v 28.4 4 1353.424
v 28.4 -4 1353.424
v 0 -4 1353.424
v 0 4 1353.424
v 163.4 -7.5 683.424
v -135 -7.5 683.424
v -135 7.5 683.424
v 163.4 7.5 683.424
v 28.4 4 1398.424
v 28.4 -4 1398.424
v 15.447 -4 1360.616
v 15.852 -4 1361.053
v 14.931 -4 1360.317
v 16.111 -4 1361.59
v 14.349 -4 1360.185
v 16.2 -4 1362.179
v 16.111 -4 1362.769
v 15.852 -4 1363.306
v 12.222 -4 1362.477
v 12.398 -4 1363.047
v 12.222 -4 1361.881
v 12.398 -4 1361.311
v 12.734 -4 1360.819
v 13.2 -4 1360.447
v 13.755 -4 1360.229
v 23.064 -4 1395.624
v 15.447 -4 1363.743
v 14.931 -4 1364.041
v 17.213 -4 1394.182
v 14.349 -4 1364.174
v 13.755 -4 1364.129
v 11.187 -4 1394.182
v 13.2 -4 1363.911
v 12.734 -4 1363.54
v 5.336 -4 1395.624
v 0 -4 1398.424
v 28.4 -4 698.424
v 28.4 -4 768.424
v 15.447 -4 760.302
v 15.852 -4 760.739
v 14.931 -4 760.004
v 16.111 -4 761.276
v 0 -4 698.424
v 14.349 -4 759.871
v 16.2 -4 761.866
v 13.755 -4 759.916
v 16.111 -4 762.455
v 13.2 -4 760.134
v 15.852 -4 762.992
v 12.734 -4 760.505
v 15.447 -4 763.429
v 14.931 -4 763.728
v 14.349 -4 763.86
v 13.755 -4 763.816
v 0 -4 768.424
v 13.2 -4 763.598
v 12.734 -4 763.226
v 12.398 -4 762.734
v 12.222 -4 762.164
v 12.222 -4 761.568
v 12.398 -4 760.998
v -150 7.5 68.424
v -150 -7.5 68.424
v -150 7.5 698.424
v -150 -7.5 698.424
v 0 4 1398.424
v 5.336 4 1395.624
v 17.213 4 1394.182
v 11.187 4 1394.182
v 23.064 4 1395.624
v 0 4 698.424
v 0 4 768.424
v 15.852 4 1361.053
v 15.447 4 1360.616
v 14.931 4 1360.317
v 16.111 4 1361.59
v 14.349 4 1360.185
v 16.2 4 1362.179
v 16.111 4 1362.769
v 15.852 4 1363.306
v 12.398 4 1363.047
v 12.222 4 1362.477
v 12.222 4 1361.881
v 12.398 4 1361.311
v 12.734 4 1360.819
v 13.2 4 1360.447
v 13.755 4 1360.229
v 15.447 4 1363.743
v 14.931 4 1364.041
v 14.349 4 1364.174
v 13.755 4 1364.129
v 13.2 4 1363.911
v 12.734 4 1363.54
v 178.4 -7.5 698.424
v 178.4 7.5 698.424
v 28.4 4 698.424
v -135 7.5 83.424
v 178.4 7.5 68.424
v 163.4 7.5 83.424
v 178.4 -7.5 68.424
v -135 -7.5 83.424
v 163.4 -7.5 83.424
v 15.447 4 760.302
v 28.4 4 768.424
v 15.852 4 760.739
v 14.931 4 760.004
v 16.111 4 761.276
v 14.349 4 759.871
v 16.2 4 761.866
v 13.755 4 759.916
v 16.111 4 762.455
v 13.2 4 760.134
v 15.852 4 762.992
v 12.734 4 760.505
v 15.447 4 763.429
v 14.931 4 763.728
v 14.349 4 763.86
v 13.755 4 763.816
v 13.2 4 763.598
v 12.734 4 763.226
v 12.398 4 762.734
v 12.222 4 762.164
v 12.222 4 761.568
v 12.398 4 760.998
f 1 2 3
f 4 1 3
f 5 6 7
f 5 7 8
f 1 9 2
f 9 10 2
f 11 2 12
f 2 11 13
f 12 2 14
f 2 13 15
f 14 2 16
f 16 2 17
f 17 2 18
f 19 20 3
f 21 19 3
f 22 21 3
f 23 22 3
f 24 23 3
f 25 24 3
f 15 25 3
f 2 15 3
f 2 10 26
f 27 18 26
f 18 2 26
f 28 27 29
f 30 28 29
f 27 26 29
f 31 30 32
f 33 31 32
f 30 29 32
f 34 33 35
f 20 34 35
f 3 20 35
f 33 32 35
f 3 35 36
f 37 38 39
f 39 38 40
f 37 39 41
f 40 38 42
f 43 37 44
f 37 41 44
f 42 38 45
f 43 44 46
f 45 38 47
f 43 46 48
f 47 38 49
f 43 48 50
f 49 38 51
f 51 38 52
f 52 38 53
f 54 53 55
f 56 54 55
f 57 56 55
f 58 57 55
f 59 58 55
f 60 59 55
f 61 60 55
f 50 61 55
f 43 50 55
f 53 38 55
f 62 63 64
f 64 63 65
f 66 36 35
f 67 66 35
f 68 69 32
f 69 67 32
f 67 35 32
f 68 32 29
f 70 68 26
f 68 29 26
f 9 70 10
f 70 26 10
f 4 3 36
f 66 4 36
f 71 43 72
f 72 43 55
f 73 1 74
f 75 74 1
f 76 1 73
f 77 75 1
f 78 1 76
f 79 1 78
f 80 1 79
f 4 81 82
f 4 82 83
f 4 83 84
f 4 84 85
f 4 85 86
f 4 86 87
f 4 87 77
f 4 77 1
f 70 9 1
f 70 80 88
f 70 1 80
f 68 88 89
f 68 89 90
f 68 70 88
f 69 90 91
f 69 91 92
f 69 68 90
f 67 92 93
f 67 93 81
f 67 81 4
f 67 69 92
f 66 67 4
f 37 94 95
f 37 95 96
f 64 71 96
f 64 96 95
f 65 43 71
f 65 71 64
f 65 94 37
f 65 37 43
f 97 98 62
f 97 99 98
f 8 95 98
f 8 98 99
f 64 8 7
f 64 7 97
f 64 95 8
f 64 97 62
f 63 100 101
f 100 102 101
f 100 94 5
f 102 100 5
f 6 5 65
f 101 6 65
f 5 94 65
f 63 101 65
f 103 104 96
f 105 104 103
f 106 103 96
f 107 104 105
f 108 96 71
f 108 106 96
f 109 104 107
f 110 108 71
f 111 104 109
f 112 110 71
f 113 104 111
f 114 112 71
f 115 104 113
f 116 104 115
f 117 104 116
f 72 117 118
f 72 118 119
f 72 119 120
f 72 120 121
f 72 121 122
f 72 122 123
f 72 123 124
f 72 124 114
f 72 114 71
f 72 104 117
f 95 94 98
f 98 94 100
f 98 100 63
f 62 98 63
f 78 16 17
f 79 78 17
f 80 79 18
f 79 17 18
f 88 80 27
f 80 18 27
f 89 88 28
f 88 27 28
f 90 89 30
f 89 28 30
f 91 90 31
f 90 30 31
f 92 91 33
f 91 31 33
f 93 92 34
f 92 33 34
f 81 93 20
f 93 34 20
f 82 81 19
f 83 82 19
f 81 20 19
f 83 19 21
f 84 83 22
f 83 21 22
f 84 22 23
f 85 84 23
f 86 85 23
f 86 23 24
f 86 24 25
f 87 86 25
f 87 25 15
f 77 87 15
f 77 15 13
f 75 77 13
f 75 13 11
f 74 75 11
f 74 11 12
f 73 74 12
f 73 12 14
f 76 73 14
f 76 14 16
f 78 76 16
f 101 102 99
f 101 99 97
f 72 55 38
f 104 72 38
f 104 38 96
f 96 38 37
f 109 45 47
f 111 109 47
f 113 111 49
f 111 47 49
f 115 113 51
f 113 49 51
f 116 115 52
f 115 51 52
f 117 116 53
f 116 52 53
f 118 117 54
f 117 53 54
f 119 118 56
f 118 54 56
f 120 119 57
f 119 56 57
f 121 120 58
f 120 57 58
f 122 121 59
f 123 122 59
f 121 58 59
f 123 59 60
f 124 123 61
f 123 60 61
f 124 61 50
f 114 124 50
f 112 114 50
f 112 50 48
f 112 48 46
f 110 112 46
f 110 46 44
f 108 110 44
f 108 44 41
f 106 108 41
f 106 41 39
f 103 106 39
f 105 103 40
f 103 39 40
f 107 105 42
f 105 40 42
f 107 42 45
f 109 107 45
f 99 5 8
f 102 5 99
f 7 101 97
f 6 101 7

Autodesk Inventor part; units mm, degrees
ref_plane "YZ Plane" through (0, 0, 0) normal (1, 0, 0) x (0, 1, 0)
ref_plane "XZ Plane" through (0, 0, 0) normal (0, 1, 0) x (-1, 0, 0)
sketch "Boceto2" plane through (0, 0, 0) normal (0, 1, 0) x (-1, 0, 0)
  line L0 (350, 0) -> (-350, 0)
  line L1 (-350, 0) -> (-350, 1000)
  line L2 (-120, 1500) -> (80, 1500)
  line L3 (350, 1000) -> (350, 0)
  line L4 (80, 1000) -> (80, 1500)
  line L5 (-120, 1000) -> (-120, 1500)
  line L6 (350, 1000) -> (80, 1000)
  line L7 (-120, 1000) -> (-350, 1000)
  arc A0 (-28.4, 1398.4243) -> (0, 1398.4243) centre (-14.2, 1419) ccw
  line L8 (-28.4, 1398.4243) -> (-28.4, 698.4243)
  line L9 (-28.4, 698.4243) -> (0, 698.4243)
  line L10 (0, 698.4243) -> (0, 1398.4243)
  line L11 (150, 698.4243) -> (-178.4, 698.4243)
  line L12 (-178.4, 698.4243) -> (-178.4, 68.4243)
  line L13 (-178.4, 68.4243) -> (150, 68.4243)
  line L14 (150, 68.4243) -> (150, 698.4243)
  point P0 (-14.2, 698.4243)
  dimension "d16" = 105.8
  dimension "d17" = 81
  dimension "d18" = 700
  dimension "d19" = 28.4
  dimension "d21" = 630
  dimension "d22" = 150
  dimension "d23" = 150
  dimension "d24" = 0
extrude "Extrusión1" add sketch "Boceto2" along normal mid plane 15 contours L9 L11 L14 L13 L12
extrude "Extrusión2" add sketch "Boceto2" along normal mid plane 8 contours A0 L10 L9 L8
sketch "Boceto3" plane through (0, -7.5, 0) normal (0, -1, 0) x (1, 0, 0)
  line L0 (-150, 698.4243) -> (178.4, 698.4243) projected
  line L1 (178.4, 698.4243) -> (178.4, 68.4243) projected
  line L2 (-150, 698.4243) -> (178.4, 698.4243)
  line L3 (178.4, 698.4243) -> (178.4, 68.4243)
  line L4 (178.4, 68.4243) -> (-150, 68.4243)
  line L5 (-150, 68.4243) -> (-150, 698.4243)
  line L6 (-135, 683.4243) -> (163.4, 683.4243)
  line L7 (163.4, 683.4243) -> (163.4, 83.4243)
  line L8 (163.4, 83.4243) -> (-135, 83.4243)
  line L9 (-135, 83.4243) -> (-135, 683.4243)
  point P0 (0, 0)
  dimension "d29" = 15
  dimension "d30" = 15
  dimension "d31" = 15
  dimension "d32" = 15
  dimension "d49" = 630
extrude "Extrusión3" cut sketch "Boceto3" against normal blind 15 contours L6 L7 L8 L9
sketch "Boceto4" plane through (0, -4, 0) normal (0, -1, 0) x (1, 0, 0)
  line L0 (0, 698.4243) -> (0, 1398.4243) projected
  line L1 (28.4, 1398.4243) -> (28.4, 698.4243) projected
  line L2 (0, 768.4243) -> (28.4, 768.4243)
  line L3 (28.4, 768.4243) -> (28.4, 1353.4243)
  line L4 (28.4, 1353.4243) -> (0, 1353.4243)
  line L5 (0, 1353.4243) -> (0, 768.4243)
  line L6 (178.4, 698.4243) -> (-150, 698.4243) projected
  circle A0 centre (14.2, 1362.1792) radius 2
  circle A1 centre (14.2, 761.8658) radius 2
  point P0 (0, 0)
  point P1 (14.2, 698.4243)
  point P2 (14.2, 1353.4243)
  point P3 (0, 1353.4243)
  dimension "d35" = 70
  dimension "d36" = 45
  dimension "d37" = 4
  dimension "d38" = 4
extrude "Extrusión4" cut sketch "Boceto4" against normal blind 15 contours L0 L4 L1 L2 | A0 | A1
ref_plane "Plano de trabajo1" through (0, 0, 0) normal (0, -1, 0) x (1, 0, 0)
sketch "Boceto5" plane through (0, 0, 0) normal (0, -1, 0) x (1, 0, 0)
  circle A0 centre (14.2, 1362.1792) radius 2
  point P0 (0, 0)
  point P1 (14.2, 761.8658)
  point P2 (14.2, 759.8658)
  point P3 (14.2, 763.8658)
  point P4 (14.2, 1364.1792)
  point P5 (14.2, 1360.1792)
sketch "Boceto6" plane through (178.4, 7.5, 68.4243) normal (0, 0, -1) x (-1, 0, 0)
  line L0 (0, -15) -> (0, 0) projected
  line L1 (0, 0) -> (328.4, 0) projected
  point P0 (178.4, -7.5)
  point P1 (164.2, -7.5)
  point P2 (0, -7.5)
  dimension "d41" = 164.2
  dimension "d42" = 7.5
properties part number "Marco_apm_002-1"
